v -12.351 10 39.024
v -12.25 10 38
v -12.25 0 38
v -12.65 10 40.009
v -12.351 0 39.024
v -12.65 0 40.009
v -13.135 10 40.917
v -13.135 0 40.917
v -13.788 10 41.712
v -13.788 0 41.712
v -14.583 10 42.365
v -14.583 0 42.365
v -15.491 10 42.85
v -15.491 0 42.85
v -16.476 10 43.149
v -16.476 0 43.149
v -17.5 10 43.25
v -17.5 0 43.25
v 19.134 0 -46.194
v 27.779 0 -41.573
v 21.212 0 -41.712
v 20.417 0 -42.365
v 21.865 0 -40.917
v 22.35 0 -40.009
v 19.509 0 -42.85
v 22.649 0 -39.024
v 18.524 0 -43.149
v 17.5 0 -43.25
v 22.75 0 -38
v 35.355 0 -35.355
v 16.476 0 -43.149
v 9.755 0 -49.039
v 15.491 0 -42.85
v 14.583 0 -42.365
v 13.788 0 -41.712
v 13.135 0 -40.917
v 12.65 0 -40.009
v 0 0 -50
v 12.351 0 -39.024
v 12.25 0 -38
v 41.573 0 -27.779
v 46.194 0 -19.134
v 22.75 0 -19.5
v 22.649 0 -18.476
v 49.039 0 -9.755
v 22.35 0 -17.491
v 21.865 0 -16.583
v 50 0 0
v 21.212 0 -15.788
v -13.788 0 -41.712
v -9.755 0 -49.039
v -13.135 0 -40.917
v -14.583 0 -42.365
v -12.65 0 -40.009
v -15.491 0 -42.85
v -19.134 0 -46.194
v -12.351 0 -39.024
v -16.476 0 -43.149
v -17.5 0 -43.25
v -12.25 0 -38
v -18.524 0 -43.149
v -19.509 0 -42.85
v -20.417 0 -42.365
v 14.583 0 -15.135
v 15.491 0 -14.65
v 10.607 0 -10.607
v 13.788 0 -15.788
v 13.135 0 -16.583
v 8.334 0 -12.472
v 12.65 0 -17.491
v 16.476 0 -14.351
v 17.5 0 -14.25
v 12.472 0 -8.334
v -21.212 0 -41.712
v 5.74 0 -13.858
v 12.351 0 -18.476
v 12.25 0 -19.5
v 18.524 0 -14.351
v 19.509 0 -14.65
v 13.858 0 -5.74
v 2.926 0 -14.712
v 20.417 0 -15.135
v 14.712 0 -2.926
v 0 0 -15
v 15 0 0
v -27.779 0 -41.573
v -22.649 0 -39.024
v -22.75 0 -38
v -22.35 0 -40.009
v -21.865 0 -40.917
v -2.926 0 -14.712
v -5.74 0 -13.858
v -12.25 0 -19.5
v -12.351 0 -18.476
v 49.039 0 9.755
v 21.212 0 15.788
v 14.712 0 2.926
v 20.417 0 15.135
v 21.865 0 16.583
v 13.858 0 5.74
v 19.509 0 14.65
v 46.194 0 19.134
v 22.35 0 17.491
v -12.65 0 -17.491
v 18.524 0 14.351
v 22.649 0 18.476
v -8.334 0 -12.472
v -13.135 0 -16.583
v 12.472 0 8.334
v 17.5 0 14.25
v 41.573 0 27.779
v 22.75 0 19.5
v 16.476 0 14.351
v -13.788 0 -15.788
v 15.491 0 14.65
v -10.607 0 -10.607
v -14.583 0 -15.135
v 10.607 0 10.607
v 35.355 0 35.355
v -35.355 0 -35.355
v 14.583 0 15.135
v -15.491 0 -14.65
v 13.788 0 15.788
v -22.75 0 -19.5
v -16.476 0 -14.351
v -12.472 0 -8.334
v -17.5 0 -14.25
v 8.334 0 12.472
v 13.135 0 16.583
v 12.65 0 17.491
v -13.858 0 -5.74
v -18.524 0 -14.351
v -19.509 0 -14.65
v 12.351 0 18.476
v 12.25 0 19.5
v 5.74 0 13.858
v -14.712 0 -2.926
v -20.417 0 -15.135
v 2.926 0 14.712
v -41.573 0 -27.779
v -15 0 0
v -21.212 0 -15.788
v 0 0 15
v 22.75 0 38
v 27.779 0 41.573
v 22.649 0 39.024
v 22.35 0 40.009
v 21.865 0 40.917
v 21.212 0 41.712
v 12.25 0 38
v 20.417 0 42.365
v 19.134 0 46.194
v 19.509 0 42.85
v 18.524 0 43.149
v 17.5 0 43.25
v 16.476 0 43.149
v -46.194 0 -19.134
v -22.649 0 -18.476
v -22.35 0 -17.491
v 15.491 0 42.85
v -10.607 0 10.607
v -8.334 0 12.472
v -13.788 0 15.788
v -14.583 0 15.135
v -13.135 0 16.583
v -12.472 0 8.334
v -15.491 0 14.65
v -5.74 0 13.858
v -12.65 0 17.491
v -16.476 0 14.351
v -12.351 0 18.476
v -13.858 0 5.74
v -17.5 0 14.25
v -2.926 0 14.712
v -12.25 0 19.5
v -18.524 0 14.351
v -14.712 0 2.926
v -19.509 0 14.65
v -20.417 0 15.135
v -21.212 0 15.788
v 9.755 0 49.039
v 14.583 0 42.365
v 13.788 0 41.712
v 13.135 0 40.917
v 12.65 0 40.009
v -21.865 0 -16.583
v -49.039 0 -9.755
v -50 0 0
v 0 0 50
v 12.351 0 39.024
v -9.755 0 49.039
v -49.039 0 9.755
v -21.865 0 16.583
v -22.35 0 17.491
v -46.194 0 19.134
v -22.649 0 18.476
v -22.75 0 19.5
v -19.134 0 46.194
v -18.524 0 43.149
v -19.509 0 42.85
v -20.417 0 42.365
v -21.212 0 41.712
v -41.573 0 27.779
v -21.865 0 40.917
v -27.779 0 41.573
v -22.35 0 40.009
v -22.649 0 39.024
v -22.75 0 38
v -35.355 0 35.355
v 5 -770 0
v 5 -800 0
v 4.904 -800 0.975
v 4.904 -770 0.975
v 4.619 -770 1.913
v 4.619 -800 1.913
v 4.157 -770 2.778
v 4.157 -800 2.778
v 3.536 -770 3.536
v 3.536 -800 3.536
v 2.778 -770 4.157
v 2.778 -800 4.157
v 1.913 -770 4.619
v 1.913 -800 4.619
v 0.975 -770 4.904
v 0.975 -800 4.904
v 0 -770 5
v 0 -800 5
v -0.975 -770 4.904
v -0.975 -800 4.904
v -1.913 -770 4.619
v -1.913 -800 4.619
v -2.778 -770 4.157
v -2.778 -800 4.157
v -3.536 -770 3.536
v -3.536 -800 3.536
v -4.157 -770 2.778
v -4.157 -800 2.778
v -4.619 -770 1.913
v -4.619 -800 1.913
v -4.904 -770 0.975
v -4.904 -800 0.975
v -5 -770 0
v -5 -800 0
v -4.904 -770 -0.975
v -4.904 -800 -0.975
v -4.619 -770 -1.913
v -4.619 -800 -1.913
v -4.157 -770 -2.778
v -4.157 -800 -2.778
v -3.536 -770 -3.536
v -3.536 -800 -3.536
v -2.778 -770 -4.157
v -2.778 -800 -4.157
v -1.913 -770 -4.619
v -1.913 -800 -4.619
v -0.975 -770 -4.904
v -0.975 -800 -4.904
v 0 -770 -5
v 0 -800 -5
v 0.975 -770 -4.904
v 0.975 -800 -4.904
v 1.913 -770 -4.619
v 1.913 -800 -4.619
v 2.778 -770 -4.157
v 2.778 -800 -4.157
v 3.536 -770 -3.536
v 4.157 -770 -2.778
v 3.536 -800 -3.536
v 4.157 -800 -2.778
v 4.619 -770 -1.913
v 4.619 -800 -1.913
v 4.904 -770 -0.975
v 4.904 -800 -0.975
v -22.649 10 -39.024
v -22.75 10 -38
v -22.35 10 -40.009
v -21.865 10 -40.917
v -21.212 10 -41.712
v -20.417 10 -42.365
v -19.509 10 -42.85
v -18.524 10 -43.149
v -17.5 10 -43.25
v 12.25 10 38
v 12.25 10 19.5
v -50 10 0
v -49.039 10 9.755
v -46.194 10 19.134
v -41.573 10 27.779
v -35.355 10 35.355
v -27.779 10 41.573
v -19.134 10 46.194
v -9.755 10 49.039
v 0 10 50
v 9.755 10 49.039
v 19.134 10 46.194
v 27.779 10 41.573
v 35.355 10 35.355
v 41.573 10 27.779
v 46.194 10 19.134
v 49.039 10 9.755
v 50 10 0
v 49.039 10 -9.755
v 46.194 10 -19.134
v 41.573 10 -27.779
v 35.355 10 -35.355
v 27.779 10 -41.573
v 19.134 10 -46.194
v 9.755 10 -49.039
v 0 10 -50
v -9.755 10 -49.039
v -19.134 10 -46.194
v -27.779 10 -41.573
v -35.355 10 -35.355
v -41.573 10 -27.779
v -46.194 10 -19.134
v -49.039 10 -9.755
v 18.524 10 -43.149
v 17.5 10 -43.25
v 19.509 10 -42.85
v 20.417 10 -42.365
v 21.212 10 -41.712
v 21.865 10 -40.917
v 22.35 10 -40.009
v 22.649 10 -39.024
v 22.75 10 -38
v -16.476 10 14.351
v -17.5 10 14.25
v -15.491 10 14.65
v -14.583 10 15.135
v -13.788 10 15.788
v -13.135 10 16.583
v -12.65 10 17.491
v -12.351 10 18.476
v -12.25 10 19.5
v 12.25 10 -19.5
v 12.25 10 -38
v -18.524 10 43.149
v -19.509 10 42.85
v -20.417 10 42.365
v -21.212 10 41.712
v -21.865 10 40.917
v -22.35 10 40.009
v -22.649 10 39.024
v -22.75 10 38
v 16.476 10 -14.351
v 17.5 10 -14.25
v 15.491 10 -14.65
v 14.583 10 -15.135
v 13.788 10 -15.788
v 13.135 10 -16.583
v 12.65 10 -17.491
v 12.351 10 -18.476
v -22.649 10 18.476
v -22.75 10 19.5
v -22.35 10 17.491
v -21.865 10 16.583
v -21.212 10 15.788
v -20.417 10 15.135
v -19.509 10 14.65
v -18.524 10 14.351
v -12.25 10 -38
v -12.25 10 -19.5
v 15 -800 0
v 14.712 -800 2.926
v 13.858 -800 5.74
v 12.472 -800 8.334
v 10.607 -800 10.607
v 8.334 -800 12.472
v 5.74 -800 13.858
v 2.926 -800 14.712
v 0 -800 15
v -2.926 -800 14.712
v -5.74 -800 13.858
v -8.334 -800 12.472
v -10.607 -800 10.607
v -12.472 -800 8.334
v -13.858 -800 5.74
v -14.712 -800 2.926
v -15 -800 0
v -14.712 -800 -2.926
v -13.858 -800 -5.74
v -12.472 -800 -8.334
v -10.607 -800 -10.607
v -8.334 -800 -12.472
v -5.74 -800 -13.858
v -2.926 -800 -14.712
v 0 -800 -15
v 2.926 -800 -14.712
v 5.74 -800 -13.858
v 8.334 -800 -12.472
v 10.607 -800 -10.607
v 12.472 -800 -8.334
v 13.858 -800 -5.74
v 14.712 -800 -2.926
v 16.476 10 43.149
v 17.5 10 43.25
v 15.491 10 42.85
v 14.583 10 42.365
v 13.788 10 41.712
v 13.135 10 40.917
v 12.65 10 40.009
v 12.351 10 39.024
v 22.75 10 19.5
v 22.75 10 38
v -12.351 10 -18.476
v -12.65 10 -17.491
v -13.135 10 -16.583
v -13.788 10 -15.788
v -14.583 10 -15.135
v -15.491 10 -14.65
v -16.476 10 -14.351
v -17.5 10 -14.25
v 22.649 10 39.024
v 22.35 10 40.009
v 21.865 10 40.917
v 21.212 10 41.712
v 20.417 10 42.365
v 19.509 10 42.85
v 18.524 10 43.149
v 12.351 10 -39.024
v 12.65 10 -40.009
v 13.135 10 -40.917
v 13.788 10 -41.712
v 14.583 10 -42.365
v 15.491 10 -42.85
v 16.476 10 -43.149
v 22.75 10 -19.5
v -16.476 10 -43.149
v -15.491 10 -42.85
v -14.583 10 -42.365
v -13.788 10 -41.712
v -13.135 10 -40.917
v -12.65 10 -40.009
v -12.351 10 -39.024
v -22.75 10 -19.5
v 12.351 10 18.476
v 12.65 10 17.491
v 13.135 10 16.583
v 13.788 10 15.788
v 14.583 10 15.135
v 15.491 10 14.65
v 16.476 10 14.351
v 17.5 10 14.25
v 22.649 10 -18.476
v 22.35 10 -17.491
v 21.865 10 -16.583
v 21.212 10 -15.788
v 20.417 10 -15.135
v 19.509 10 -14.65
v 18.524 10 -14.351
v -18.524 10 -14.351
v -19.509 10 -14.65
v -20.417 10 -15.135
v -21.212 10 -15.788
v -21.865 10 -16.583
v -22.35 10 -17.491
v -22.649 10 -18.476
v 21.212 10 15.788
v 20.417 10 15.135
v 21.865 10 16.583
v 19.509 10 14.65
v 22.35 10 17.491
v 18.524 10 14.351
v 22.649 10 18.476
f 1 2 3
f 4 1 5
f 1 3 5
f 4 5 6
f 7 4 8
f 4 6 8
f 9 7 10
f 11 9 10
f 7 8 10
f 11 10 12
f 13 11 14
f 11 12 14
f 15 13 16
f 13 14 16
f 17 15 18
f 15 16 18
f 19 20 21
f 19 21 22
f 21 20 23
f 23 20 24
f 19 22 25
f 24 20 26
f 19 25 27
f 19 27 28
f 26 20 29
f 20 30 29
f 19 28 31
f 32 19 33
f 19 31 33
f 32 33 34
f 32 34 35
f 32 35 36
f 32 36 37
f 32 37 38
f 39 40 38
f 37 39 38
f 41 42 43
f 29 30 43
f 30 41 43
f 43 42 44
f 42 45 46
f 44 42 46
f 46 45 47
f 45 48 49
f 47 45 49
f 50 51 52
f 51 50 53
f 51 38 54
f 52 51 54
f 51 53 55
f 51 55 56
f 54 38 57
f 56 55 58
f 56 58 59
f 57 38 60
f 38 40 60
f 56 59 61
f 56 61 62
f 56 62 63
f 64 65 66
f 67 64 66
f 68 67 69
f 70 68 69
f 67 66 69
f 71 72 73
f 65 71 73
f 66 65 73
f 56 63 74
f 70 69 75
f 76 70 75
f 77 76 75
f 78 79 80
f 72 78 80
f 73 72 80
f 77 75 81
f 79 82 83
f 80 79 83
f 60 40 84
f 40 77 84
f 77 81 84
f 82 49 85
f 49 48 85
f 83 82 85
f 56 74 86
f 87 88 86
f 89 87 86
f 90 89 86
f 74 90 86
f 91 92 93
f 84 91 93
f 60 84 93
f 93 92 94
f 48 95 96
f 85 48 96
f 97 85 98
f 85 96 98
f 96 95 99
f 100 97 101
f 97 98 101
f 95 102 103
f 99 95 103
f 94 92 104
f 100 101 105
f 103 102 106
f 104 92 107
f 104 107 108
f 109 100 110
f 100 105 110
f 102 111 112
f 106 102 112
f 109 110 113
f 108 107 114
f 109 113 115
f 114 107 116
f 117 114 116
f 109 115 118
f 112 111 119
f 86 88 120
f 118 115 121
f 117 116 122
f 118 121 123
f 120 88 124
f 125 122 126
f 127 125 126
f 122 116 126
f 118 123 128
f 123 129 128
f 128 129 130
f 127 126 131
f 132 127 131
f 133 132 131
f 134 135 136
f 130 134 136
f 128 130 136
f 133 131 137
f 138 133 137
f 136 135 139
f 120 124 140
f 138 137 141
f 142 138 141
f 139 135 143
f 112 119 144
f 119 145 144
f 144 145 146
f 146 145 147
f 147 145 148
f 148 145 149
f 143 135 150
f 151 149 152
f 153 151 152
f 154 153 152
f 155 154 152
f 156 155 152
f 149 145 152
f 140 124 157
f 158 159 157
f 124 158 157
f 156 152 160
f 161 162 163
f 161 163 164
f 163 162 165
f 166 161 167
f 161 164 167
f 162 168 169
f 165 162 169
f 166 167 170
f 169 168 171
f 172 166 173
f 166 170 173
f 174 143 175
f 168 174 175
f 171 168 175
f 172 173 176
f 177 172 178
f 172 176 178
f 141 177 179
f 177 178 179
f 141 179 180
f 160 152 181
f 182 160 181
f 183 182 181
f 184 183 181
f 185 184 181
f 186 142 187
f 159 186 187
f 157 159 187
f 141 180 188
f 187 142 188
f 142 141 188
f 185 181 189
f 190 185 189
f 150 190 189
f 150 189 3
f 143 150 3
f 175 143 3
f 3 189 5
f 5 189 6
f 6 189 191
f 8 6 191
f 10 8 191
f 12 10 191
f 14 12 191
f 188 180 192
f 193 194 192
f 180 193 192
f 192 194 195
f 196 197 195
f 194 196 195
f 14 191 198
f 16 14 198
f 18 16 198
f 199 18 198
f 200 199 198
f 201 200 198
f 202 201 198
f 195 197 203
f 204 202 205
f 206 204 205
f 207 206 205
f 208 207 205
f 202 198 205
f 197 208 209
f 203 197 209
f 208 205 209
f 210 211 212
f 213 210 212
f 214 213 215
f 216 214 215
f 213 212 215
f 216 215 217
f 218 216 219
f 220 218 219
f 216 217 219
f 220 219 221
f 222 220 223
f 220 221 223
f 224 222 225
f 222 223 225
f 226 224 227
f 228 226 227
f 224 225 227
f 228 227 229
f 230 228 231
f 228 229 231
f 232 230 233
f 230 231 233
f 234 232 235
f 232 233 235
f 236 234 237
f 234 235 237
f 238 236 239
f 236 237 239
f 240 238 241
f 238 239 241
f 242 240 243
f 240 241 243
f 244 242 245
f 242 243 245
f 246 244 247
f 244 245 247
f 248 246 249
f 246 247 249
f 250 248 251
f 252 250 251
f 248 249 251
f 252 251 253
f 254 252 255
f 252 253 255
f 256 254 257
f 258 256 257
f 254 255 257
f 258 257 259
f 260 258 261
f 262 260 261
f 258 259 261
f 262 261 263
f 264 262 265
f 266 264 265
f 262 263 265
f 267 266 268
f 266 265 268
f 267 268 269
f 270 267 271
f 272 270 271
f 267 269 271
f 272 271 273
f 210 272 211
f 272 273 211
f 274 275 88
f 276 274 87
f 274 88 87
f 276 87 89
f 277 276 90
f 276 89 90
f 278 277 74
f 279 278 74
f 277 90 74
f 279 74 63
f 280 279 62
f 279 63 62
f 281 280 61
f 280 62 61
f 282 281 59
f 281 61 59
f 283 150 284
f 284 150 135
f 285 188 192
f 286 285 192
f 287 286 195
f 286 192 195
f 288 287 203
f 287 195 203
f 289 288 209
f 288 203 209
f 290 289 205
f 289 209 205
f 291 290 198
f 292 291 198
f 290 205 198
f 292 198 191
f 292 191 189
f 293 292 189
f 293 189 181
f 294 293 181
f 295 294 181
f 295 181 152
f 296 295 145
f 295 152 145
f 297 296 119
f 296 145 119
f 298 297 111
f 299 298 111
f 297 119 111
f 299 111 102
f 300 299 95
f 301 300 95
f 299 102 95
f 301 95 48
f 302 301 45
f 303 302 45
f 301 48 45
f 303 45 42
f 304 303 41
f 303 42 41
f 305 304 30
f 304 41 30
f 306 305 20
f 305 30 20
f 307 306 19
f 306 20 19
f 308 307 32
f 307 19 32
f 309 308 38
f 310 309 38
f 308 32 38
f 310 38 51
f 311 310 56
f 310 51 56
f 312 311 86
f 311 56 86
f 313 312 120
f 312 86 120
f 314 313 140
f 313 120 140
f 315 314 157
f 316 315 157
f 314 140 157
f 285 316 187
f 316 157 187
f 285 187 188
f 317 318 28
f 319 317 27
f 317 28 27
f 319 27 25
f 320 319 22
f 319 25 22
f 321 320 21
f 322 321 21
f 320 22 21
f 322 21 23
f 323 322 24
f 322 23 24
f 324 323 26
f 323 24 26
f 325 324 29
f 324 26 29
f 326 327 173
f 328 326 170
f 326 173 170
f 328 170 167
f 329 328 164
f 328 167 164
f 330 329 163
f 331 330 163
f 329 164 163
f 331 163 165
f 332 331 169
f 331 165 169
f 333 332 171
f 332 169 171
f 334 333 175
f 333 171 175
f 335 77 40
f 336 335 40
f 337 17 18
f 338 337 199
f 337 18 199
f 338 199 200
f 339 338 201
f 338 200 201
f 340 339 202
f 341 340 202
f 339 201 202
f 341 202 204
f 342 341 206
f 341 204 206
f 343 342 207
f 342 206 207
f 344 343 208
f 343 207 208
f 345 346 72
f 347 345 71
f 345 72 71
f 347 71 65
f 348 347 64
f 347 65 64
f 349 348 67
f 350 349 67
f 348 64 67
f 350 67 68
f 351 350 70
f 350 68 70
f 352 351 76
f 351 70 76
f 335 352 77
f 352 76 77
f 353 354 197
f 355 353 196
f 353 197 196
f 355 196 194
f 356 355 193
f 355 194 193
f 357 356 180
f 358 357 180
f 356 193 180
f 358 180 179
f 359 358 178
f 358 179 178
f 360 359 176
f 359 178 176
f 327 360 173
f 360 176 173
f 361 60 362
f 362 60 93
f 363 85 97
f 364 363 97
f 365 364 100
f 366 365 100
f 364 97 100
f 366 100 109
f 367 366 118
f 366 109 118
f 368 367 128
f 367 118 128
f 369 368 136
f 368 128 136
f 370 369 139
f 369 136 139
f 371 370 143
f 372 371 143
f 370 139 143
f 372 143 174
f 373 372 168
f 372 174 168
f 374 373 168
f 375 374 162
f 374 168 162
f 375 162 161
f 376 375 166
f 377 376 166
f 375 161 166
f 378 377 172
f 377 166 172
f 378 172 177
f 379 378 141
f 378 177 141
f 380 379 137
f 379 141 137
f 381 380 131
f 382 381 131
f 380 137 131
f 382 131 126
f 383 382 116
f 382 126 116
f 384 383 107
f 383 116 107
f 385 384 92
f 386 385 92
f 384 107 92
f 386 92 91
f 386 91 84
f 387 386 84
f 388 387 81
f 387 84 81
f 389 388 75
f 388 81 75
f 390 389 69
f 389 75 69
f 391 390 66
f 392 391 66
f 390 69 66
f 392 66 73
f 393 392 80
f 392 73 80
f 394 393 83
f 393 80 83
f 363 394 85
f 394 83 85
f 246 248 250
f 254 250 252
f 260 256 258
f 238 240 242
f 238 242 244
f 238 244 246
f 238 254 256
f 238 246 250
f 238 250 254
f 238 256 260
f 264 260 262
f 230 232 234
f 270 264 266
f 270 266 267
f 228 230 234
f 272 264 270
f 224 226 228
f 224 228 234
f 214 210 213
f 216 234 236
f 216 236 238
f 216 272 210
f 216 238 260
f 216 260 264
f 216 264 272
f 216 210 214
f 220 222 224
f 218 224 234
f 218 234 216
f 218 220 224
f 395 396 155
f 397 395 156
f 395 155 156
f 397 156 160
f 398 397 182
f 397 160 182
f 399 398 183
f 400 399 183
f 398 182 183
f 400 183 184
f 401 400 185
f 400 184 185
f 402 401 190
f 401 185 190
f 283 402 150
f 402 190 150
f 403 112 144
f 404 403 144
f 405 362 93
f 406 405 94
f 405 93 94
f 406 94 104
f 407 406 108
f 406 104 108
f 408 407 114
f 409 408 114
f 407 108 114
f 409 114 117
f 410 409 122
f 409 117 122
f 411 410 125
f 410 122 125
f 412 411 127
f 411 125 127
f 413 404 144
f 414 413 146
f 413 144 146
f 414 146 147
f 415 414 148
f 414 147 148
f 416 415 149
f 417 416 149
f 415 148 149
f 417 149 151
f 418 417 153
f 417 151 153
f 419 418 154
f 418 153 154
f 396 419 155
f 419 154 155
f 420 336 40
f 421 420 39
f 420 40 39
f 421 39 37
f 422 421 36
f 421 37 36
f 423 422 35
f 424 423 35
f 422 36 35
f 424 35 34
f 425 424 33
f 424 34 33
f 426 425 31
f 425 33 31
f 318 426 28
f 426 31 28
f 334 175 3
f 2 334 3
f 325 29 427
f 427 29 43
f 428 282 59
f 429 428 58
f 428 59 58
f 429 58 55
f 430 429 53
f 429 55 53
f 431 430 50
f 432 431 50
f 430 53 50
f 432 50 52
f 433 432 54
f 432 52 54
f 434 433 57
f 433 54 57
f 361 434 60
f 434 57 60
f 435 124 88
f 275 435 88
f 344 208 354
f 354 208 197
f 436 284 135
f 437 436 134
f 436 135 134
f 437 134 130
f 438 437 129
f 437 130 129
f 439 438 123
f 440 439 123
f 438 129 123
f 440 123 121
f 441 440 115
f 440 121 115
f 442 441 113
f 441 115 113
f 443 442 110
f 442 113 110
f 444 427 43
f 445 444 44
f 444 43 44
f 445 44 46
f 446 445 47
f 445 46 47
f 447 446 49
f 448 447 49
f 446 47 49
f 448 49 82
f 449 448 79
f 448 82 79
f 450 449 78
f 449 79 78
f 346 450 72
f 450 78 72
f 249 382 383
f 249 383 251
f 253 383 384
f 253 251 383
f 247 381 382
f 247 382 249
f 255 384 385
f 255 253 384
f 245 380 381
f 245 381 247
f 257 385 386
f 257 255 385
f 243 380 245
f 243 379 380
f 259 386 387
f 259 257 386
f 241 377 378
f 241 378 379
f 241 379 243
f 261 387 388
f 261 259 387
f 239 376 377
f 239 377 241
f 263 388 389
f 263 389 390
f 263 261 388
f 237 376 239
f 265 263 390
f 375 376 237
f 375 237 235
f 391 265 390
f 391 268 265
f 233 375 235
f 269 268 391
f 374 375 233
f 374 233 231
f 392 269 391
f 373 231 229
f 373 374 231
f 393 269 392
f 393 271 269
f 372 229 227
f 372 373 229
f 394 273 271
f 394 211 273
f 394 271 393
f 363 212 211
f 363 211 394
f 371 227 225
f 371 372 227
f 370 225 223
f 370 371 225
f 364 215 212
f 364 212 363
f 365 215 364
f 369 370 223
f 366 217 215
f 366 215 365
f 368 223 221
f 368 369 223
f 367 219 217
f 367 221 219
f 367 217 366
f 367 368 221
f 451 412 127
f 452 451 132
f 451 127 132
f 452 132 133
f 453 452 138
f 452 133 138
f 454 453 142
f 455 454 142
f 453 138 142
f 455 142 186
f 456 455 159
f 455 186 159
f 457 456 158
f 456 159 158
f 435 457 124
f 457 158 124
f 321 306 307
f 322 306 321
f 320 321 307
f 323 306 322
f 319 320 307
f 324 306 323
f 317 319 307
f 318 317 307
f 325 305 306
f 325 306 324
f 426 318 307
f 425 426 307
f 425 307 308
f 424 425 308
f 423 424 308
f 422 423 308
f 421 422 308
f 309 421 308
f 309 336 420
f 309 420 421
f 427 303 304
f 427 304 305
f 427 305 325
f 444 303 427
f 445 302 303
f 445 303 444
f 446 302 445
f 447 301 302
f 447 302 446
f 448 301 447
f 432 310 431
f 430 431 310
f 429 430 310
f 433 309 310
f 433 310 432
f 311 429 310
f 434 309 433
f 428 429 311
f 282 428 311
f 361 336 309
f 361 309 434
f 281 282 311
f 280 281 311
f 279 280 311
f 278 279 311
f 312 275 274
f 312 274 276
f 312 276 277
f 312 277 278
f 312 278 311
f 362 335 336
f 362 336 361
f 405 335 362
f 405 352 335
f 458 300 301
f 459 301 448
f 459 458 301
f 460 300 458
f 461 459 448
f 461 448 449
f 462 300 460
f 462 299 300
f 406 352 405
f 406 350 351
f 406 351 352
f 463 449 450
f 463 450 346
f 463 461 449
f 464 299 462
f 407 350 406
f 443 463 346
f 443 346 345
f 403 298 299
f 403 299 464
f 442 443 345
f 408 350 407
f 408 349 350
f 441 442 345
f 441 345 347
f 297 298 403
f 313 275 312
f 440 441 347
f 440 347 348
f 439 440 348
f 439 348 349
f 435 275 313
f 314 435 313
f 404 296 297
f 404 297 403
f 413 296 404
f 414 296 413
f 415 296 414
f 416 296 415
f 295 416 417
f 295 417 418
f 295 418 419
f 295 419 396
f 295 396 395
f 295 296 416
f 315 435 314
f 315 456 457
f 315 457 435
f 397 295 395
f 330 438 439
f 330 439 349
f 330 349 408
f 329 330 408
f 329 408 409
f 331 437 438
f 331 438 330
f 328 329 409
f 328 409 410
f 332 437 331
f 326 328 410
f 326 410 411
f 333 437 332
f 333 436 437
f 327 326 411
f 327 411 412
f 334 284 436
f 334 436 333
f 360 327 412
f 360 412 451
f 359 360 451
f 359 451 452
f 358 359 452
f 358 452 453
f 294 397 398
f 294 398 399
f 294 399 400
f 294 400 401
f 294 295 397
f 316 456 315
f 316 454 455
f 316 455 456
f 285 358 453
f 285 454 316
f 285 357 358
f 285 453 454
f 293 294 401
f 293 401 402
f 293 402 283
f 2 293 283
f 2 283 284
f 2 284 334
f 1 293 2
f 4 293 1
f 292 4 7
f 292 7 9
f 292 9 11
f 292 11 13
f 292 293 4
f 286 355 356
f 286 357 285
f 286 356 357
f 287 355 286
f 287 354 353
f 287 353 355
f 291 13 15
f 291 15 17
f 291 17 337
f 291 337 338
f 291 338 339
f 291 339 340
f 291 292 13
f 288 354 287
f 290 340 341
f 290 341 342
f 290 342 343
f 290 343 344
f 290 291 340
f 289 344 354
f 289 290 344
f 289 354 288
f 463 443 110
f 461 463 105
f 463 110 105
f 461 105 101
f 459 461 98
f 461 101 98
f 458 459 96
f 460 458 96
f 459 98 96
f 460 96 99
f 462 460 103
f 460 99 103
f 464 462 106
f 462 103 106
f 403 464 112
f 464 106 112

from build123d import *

# Parameters (mm, degrees)
F0_R     = 15
F1_DEPTH = 800
F2_R     = 50
F3_DEPTH = 10
F4_R     = 5
F5_DEPTH = 30


with BuildPart() as f1:
    # F0 (on Front) → F1 (new body)
    with BuildSketch(Plane.XZ):
        Circle(F0_R)
    extrude(amount=F1_DEPTH)

    # F2 (on face) → F3 (join)
    with BuildSketch(Plane(origin=(0, 0, 0), x_dir=(-1, 0, 0), z_dir=(0, 1, 0))):
        Circle(F2_R)
        with BuildLine():
            ThreePointArc((-17.5, -14.25), (-13.787689, -15.787689), (-12.25, -19.5))
            Line((-12.25, -19.5), (-12.25, -38))
            ThreePointArc((-12.25, -38), (-13.787689, -41.712311), (-17.5, -43.25))
            ThreePointArc((-17.5, -43.25), (-21.212311, -41.712311), (-22.75, -38))
            Line((-22.75, -38), (-22.75, -19.5))
            ThreePointArc((-22.75, -19.5), (-21.212311, -15.787689), (-17.5, -14.25))
        make_face(mode=Mode.SUBTRACT)
        with BuildLine():
            ThreePointArc((17.5, -14.25), (21.212311, -15.787689), (22.75, -19.5))
            Line((22.75, -19.5), (22.75, -38))
            ThreePointArc((22.75, -38), (21.212311, -41.712311), (17.5, -43.25))
            ThreePointArc((17.5, -43.25), (13.787689, -41.712311), (12.25, -38))
            Line((12.25, -38), (12.25, -19.5))
            ThreePointArc((12.25, -19.5), (13.787689, -15.787689), (17.5, -14.25))
        make_face(mode=Mode.SUBTRACT)
        with BuildLine():
            Line((-22.75, 19.5), (-22.75, 38))
            ThreePointArc((-22.75, 38), (-21.212311, 41.712311), (-17.5, 43.25))
            ThreePointArc((-17.5, 43.25), (-13.787689, 41.712311), (-12.25, 38))
            Line((-12.25, 38), (-12.25, 19.5))
            ThreePointArc((-12.25, 19.5), (-13.787689, 15.787689), (-17.5, 14.25))
            ThreePointArc((-17.5, 14.25), (-21.212311, 15.787689), (-22.75, 19.5))
        make_face(mode=Mode.SUBTRACT)
        with BuildLine():
            ThreePointArc((17.5, 43.25), (21.212311, 41.712311), (22.75, 38))
            Line((22.75, 38), (22.75, 19.5))
            ThreePointArc((22.75, 19.5), (21.212311, 15.787689), (17.5, 14.25))
            ThreePointArc((17.5, 14.25), (13.787689, 15.787689), (12.25, 19.5))
            Line((12.25, 19.5), (12.25, 38))
            ThreePointArc((12.25, 38), (13.787689, 41.712311), (17.5, 43.25))
        make_face(mode=Mode.SUBTRACT)
    extrude(amount=F3_DEPTH)

    # F4 (on face) → F5 (cut)
    with BuildSketch(Plane.XZ.offset(800)):
        Circle(F4_R)
    extrude(amount=-F5_DEPTH, mode=Mode.SUBTRACT)


solid = f1.part
